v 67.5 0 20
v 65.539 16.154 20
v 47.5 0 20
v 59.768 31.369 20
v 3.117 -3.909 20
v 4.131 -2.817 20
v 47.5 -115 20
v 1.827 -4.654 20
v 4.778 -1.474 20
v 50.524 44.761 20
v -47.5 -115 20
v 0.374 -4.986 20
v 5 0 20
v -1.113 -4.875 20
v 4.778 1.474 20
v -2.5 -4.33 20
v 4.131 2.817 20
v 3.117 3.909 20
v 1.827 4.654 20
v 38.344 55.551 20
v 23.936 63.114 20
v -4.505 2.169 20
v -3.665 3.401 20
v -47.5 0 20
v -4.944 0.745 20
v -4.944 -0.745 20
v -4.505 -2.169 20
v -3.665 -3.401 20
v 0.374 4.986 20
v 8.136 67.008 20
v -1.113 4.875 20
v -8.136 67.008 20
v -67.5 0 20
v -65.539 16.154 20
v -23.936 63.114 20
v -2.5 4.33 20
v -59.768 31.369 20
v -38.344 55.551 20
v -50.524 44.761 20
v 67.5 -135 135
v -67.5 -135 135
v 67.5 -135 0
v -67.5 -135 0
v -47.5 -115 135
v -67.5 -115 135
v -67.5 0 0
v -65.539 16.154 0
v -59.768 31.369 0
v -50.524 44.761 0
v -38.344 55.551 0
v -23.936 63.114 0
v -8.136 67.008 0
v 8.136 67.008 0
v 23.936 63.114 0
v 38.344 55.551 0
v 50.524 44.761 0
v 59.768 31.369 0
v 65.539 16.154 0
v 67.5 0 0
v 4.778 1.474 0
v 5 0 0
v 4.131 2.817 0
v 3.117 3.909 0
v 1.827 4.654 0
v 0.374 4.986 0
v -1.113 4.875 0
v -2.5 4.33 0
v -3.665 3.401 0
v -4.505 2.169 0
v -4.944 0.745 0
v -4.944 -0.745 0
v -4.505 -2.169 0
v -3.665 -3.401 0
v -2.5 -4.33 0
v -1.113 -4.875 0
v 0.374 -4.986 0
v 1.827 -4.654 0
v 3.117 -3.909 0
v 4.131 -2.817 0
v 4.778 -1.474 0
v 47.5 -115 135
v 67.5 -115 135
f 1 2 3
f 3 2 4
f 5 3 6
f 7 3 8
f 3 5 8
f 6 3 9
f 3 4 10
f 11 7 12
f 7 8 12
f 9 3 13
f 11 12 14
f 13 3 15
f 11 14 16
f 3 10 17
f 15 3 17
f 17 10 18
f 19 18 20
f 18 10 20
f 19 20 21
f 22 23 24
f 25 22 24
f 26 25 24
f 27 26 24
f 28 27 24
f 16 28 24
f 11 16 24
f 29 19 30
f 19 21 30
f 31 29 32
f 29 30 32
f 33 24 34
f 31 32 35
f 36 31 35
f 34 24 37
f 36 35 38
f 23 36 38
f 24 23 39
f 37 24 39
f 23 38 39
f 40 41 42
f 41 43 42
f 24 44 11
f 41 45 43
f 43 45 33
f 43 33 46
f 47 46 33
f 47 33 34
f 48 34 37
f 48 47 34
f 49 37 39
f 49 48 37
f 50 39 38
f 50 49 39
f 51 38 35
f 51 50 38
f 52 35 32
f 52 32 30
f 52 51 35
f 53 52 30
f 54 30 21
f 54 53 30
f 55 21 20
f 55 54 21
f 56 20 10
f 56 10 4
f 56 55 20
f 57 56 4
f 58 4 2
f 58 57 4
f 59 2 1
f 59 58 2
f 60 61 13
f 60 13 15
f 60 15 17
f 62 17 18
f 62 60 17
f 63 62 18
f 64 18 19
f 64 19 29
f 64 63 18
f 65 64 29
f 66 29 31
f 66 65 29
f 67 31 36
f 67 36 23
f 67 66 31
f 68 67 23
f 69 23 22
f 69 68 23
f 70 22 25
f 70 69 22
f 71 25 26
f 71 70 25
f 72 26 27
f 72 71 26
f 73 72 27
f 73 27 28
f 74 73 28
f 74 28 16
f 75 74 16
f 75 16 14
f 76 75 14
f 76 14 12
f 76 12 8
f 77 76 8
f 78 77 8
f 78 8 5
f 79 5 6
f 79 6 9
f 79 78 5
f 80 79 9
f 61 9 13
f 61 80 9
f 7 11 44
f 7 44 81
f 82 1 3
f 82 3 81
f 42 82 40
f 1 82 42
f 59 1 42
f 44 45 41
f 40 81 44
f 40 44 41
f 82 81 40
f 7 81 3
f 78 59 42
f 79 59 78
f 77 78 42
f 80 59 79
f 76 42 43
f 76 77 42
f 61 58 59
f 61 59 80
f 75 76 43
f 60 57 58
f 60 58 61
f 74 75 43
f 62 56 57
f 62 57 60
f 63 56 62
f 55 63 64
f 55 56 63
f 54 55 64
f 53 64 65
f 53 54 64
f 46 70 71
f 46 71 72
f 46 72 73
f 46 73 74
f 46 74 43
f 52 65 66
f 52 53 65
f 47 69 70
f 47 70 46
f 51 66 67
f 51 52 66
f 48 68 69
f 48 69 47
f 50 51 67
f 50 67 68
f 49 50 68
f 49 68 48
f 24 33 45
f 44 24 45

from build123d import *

# Parameters (mm, degrees)
SKETCH1_R           = 5
BOSS_EXTRUDE1_DEPTH = 20
BOSS_EXTRUDE2_DEPTH = 20
SKETCH6_W           = 95
SKETCH6_H           = 20
BOSS_EXTRUDE3_DEPTH = 115


with BuildPart() as part:
    # Sketch1 → Boss-Extrude1 (new body)
    with BuildSketch(Plane.XY):
        with BuildLine():
            Line((-67.5, -135), (-67.5, 0))
            ThreePointArc((-67.5, 0), (0, 67.5), (67.5, 0))
            Line((67.5, 0), (67.5, -135))
            Line((67.5, -135), (-67.5, -135))
        make_face()
        Circle(SKETCH1_R, mode=Mode.SUBTRACT)
    extrude(amount=BOSS_EXTRUDE1_DEPTH)

    # Sketch5 → Boss-Extrude2 (add)
    with BuildSketch(Plane(origin=(67.5, 0, 0), x_dir=(0, 0, -1), z_dir=(1, 0, 0))):
        Polygon((-20, 0), (-135, -115), (-135, -135), (-20, -135), align=None)
    boss_extrude2 = extrude(amount=-BOSS_EXTRUDE2_DEPTH)

    # Mirror1: Boss-Extrude2 across plane
    add(boss_extrude2.mirror(Plane(origin=(0, 0, 0), x_dir=(0, 0, 1), z_dir=(1, 0, 0))))

    # Sketch6 → Boss-Extrude3 (add)
    with BuildSketch(Plane.XY.offset(20)):
        with Locations((0, -125)):
            Rectangle(SKETCH6_W, SKETCH6_H)
    extrude(amount=BOSS_EXTRUDE3_DEPTH)


solid = part.part
